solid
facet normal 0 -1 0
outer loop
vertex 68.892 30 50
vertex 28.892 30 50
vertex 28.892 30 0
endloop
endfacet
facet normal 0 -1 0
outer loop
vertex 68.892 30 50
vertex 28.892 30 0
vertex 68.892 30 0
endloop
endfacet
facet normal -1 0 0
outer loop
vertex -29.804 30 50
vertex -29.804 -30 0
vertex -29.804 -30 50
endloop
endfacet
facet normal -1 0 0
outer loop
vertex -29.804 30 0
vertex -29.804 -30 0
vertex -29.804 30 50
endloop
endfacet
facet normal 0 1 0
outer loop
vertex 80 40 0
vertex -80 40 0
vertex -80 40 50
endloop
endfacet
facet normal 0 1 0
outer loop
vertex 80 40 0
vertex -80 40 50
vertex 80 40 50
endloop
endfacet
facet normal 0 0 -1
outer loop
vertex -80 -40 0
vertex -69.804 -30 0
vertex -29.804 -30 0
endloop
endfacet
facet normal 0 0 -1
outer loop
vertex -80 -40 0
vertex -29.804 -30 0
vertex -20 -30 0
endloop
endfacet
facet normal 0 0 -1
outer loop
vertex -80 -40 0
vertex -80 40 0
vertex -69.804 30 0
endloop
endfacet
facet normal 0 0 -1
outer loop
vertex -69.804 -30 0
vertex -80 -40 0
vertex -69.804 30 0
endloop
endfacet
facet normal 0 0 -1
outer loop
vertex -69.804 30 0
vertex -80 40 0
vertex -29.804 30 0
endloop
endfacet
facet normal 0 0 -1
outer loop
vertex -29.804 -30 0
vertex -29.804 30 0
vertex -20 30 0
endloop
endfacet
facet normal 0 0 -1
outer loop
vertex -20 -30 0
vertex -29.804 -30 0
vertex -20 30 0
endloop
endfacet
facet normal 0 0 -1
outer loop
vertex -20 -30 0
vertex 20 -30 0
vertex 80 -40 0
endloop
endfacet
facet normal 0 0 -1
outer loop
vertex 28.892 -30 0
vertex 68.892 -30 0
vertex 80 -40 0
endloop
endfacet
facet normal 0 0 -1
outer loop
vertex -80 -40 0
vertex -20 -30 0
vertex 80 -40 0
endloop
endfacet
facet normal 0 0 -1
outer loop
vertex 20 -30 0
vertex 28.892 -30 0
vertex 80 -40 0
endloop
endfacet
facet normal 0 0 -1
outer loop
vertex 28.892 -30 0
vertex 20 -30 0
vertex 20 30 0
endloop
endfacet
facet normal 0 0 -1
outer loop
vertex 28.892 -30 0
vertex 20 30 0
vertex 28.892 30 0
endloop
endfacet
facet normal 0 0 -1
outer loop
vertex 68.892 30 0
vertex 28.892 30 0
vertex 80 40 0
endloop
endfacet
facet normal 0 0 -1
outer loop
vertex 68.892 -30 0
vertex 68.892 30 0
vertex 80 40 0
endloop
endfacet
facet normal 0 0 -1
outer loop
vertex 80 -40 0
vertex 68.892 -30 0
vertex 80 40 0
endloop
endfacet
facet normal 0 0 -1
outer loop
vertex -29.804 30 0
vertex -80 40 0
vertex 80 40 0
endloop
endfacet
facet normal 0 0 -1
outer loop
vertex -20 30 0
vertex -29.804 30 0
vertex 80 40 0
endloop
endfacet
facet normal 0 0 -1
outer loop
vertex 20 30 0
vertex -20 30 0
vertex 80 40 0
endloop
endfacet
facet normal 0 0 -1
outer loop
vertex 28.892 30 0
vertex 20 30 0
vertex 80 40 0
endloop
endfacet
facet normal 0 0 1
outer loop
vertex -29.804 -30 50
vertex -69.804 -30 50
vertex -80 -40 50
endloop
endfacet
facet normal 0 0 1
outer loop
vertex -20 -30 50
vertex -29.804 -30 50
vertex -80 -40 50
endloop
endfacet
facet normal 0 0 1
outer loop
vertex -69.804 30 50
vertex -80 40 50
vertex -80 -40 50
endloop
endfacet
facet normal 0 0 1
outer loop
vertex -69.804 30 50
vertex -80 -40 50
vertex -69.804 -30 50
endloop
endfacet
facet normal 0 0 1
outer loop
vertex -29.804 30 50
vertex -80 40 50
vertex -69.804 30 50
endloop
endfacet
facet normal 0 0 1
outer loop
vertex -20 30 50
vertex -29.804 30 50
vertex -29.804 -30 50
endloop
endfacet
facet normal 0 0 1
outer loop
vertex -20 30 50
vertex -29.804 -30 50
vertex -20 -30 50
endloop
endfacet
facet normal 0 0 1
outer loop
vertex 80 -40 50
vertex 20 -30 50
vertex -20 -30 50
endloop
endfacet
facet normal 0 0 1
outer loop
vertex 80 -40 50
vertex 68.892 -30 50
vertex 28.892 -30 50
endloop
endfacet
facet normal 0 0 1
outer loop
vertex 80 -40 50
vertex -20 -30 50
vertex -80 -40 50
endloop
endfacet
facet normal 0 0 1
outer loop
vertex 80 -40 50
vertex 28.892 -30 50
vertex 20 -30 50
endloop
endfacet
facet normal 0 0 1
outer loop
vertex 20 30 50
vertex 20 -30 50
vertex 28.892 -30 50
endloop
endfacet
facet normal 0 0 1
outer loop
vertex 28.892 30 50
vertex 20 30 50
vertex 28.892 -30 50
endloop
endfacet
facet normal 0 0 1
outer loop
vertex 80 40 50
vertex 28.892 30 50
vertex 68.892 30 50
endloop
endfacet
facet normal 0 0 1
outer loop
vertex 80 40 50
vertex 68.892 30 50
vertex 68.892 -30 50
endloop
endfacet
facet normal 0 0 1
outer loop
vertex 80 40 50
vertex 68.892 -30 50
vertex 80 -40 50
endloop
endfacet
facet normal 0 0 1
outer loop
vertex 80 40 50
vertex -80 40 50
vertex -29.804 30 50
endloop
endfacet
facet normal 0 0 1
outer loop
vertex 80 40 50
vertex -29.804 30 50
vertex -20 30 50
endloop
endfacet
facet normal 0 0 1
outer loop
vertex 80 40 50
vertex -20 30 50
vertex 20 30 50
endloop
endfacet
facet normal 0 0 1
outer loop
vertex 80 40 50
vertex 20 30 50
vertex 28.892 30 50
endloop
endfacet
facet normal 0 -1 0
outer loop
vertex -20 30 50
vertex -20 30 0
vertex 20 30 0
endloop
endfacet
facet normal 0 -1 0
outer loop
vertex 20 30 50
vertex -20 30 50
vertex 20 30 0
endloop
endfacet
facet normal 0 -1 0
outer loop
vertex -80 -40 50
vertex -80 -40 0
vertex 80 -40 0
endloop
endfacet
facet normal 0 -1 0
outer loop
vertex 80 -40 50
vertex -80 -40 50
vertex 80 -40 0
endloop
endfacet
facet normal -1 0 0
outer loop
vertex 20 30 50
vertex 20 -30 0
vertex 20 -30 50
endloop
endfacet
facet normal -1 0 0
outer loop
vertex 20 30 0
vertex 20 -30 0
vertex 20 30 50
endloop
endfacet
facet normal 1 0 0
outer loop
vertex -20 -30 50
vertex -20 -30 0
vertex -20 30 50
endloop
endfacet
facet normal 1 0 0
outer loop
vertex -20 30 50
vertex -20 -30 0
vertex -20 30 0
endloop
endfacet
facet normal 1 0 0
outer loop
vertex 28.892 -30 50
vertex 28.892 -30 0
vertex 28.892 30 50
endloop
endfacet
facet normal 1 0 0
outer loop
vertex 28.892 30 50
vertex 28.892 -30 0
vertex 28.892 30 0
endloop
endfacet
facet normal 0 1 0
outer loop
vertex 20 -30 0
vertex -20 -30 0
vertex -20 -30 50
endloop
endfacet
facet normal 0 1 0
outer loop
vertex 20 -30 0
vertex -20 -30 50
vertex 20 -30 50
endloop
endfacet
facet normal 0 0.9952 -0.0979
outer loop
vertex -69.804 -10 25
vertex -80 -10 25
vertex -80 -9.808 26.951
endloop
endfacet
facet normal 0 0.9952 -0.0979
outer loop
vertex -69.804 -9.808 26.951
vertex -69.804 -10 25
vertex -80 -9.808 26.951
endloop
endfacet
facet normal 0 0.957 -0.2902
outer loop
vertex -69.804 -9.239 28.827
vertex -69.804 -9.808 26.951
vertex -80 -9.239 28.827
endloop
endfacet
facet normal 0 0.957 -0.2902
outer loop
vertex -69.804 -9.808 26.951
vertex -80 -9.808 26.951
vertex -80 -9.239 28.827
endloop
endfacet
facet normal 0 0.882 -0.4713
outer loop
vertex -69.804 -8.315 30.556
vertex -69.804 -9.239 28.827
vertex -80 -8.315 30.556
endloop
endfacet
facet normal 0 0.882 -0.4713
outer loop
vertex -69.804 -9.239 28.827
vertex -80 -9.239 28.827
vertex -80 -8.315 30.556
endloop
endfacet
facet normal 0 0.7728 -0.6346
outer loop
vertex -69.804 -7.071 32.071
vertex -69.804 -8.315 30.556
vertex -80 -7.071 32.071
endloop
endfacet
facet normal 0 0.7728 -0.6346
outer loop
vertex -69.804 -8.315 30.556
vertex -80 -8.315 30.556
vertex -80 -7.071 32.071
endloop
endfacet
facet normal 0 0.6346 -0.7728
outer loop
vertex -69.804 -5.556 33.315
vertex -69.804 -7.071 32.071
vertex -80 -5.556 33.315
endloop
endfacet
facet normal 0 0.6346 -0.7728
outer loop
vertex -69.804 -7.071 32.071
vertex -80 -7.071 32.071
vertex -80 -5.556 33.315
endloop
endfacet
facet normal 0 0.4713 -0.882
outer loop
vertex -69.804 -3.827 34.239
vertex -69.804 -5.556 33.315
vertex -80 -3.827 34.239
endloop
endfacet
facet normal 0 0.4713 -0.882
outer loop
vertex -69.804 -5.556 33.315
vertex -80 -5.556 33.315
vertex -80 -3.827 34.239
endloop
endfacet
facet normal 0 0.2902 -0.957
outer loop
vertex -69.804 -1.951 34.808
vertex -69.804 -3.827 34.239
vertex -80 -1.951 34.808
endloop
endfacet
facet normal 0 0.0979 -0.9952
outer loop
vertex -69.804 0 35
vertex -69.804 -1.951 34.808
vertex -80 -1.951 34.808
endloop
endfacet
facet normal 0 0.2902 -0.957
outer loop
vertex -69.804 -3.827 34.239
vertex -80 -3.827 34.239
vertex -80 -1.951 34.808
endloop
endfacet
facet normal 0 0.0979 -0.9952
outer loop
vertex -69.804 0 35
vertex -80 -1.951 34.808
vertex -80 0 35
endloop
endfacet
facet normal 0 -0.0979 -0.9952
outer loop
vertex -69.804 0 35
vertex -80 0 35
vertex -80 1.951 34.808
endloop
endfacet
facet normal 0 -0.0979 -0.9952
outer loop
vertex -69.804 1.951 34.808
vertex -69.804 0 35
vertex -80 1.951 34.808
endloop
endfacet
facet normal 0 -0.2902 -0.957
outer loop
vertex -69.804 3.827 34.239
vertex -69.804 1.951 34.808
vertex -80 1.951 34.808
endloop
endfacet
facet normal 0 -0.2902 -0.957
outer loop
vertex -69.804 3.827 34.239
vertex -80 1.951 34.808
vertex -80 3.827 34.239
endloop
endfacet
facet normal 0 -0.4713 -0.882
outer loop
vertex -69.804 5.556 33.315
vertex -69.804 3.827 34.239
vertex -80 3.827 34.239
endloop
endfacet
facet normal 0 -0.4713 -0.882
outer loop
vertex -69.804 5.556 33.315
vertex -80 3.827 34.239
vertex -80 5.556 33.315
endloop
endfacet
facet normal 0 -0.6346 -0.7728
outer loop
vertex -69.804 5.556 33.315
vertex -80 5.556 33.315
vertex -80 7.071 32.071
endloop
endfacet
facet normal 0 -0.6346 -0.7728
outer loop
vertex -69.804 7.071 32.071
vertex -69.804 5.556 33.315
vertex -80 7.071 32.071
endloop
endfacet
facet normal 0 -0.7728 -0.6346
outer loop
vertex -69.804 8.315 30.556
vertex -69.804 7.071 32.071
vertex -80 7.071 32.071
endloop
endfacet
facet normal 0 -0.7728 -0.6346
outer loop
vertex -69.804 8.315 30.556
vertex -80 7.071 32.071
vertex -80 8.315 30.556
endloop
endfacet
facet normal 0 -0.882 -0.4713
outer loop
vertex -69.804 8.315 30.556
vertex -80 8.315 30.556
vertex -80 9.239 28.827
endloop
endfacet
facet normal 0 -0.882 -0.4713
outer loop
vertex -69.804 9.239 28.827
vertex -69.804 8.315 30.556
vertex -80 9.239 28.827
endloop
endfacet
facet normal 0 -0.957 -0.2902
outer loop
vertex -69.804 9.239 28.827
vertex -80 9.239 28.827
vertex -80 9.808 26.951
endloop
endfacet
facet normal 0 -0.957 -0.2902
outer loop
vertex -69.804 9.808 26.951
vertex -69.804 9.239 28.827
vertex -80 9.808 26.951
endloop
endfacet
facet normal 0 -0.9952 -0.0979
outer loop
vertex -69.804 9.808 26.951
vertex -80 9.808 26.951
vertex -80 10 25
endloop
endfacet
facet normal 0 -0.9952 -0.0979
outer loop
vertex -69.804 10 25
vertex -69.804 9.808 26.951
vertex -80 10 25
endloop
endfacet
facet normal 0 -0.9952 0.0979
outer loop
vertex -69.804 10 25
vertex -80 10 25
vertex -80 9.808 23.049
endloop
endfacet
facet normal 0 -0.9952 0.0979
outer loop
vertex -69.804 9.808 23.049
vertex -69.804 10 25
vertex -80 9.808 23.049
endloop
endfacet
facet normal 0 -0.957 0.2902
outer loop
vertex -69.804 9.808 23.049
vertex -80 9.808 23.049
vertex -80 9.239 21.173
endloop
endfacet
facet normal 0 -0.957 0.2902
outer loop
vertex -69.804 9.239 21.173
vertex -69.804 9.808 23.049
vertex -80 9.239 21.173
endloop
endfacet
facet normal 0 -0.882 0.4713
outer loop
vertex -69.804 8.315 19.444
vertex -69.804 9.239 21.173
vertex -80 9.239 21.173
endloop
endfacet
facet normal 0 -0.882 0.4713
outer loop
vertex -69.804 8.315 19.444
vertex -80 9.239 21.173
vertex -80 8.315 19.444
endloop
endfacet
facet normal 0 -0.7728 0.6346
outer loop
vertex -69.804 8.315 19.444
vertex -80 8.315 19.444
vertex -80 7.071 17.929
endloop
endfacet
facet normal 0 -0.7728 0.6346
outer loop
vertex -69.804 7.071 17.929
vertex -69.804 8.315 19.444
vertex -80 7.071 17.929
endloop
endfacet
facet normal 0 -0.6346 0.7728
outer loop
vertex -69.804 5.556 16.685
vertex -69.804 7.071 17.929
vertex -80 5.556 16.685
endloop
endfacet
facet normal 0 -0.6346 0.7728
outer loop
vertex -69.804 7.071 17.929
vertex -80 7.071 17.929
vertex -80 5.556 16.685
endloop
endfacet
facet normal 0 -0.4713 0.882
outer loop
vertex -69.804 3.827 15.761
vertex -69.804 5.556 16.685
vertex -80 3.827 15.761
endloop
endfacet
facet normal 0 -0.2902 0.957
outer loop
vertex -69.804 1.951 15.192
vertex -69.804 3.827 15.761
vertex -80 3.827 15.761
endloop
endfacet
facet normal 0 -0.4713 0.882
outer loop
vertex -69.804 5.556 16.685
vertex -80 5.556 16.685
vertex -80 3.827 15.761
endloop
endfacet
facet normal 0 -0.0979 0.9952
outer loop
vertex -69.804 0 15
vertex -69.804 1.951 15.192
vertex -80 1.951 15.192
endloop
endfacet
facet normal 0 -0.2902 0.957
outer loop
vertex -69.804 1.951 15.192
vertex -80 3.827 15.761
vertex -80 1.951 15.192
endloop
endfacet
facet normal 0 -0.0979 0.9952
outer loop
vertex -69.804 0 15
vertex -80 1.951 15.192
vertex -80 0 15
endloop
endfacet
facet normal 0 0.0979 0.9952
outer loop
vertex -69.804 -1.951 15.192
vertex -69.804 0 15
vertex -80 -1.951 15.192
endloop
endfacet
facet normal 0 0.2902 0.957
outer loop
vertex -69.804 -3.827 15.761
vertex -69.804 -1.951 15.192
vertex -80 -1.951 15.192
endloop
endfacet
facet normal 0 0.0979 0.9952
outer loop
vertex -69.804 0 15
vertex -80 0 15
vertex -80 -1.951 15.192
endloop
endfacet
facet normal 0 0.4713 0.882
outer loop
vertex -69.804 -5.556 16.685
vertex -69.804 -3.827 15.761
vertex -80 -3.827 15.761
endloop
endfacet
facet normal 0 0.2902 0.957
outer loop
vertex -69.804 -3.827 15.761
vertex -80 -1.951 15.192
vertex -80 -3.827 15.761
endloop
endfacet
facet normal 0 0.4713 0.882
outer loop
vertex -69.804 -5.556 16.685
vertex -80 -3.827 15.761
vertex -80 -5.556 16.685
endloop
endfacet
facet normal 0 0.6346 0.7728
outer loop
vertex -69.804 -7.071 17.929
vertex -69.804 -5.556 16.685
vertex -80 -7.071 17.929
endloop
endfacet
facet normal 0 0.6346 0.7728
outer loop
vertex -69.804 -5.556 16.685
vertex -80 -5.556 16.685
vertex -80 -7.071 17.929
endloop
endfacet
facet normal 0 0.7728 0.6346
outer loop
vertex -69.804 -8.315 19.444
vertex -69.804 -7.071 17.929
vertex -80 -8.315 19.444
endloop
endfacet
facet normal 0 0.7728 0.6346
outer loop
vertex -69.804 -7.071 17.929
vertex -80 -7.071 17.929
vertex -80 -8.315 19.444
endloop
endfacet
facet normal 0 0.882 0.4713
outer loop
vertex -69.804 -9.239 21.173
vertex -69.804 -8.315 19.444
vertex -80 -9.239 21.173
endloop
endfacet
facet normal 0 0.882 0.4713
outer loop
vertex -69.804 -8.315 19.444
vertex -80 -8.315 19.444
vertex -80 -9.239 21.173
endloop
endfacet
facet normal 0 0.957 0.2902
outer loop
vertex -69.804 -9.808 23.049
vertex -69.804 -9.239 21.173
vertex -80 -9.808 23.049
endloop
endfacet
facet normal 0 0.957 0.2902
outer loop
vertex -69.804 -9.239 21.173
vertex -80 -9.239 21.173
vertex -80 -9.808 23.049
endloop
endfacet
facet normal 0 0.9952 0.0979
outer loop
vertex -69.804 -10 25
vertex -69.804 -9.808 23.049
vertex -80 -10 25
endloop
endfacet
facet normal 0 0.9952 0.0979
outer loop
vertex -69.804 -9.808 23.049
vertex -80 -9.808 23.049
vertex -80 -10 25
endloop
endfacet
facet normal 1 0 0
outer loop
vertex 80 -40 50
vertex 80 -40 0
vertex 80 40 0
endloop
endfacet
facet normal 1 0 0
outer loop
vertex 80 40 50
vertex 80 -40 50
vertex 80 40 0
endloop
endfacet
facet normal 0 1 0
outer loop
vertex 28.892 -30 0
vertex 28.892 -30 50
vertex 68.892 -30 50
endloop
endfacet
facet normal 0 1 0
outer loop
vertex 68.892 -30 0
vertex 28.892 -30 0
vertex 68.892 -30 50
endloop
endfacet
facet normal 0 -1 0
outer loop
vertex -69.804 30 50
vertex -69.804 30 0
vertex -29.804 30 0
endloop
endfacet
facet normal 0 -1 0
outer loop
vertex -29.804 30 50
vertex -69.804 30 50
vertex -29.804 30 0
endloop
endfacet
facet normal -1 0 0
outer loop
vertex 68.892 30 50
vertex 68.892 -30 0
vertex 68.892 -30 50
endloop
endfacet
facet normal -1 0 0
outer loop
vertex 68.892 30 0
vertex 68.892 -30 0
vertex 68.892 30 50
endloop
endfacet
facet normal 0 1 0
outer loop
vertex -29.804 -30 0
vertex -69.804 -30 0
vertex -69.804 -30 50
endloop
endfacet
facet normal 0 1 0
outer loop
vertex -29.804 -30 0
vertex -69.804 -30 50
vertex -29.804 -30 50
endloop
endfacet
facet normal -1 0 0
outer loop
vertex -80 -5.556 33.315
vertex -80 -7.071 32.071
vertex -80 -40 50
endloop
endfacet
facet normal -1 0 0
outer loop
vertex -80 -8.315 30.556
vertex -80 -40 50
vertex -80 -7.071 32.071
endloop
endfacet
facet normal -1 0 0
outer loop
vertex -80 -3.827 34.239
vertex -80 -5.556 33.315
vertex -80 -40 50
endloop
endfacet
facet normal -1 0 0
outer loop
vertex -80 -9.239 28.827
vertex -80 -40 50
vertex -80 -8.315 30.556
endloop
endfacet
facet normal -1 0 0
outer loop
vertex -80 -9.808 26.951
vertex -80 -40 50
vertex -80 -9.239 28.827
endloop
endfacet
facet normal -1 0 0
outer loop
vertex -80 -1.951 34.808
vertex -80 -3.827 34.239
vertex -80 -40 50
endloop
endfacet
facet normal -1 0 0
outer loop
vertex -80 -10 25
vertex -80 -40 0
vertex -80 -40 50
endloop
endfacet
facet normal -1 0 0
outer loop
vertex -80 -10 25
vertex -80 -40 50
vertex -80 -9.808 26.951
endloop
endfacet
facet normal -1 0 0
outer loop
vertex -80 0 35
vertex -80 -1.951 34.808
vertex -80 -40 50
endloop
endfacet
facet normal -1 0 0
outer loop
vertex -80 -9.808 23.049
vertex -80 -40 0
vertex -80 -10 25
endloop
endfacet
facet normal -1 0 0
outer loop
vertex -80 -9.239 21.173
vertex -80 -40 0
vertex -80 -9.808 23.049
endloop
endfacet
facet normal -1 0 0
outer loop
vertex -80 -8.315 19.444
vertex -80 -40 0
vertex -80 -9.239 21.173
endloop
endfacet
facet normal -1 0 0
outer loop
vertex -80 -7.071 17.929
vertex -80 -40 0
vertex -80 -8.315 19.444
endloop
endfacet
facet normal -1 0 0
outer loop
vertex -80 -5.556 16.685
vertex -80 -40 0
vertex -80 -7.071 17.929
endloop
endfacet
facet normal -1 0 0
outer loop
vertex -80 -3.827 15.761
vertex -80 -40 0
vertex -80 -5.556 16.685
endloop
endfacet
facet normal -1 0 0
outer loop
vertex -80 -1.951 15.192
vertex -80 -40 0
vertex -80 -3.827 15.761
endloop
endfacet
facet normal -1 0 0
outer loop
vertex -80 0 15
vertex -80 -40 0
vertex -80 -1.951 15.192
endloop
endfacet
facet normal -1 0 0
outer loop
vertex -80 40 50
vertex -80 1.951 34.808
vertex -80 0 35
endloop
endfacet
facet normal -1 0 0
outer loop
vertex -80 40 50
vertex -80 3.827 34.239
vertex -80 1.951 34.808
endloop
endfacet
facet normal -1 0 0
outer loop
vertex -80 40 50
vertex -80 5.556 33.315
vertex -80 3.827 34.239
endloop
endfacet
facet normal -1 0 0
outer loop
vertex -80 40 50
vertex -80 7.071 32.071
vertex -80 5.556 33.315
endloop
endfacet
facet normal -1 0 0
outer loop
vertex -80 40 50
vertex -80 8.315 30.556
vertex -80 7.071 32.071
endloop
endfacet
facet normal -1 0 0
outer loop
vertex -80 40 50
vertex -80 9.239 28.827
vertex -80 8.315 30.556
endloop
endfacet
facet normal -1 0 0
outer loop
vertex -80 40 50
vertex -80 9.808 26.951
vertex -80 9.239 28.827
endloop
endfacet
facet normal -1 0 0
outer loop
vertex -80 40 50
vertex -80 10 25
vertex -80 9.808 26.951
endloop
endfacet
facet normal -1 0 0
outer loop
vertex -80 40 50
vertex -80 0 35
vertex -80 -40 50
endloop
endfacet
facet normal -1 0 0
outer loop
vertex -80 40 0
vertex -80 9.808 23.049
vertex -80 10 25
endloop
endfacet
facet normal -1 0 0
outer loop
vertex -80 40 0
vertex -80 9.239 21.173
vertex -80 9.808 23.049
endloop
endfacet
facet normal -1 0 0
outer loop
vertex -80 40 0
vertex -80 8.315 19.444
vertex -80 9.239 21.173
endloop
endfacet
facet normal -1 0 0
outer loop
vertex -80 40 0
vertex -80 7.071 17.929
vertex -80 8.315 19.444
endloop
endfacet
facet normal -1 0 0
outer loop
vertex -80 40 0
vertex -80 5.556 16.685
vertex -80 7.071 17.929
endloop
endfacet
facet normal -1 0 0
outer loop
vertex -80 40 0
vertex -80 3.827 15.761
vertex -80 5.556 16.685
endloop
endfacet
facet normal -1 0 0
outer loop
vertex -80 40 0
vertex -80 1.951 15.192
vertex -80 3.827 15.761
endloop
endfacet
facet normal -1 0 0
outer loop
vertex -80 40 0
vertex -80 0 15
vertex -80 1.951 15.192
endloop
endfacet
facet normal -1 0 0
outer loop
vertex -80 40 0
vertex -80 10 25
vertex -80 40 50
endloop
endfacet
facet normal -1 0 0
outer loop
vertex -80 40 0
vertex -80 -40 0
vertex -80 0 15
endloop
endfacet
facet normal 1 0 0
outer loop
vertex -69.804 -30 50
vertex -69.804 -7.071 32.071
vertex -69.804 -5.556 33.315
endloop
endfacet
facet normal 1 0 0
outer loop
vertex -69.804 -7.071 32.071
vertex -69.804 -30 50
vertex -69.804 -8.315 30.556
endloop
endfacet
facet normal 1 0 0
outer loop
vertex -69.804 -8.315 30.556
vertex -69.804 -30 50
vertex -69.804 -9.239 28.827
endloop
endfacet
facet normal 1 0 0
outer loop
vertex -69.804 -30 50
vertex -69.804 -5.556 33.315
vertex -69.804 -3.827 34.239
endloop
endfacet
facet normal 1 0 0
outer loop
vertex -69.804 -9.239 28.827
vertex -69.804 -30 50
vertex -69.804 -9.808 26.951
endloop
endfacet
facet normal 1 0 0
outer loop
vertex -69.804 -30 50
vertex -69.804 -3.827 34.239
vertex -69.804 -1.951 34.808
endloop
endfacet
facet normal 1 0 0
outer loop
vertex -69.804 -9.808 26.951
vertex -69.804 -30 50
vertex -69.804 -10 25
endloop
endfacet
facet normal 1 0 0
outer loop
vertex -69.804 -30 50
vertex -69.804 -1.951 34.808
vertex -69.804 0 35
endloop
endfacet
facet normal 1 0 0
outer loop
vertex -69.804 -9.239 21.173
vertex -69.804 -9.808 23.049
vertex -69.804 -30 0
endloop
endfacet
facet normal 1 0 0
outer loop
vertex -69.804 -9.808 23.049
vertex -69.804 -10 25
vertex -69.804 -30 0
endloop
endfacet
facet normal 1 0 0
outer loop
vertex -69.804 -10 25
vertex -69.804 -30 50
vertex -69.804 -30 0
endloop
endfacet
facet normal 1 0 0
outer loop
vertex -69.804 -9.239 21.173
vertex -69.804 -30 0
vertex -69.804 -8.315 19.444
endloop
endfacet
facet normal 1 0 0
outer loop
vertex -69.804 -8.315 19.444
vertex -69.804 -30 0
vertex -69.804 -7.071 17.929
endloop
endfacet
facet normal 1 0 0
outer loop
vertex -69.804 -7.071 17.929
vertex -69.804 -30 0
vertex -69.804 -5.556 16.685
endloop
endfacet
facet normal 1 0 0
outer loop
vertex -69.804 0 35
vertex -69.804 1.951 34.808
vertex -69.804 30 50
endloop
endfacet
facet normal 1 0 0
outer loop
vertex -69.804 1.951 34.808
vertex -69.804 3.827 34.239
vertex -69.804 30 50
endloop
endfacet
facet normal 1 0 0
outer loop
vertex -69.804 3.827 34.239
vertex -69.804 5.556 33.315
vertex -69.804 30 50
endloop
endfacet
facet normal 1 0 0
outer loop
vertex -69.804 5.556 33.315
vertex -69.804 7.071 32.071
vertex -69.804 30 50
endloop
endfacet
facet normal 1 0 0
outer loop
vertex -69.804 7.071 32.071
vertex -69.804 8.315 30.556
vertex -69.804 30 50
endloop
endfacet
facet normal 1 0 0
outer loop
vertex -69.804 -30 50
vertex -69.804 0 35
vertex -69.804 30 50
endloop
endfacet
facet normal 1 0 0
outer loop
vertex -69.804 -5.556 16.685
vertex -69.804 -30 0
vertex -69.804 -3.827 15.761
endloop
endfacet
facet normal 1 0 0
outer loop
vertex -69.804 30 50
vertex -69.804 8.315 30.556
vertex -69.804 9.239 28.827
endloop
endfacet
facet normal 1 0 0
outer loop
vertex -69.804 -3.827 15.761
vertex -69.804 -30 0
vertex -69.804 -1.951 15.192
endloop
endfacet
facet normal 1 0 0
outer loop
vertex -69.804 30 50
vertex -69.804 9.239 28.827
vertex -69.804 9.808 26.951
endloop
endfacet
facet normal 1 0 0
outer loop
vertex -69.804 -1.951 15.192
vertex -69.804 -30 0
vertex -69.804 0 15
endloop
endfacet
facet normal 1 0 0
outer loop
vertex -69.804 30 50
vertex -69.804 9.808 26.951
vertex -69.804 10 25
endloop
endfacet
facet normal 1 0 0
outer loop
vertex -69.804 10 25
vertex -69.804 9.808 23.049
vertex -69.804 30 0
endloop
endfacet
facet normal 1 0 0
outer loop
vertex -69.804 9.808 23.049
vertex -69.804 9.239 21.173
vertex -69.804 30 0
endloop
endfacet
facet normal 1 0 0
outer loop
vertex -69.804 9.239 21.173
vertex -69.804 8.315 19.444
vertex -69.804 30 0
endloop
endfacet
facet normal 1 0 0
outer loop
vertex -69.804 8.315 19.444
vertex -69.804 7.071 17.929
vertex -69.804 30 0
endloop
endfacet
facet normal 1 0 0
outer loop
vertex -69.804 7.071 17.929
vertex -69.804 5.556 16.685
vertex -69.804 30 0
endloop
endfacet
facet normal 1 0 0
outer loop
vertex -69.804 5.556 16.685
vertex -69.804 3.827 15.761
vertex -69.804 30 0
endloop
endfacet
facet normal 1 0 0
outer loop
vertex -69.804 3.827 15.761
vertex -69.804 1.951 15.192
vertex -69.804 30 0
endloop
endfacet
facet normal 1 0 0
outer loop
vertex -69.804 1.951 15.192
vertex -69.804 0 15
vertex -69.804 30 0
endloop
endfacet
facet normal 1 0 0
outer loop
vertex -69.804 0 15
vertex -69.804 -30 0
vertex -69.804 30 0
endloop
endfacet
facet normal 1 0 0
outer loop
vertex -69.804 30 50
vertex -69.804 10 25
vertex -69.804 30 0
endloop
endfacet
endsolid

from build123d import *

# Parameters (mm, degrees)
SKETCH_W     = 160
SKETCH_H     = 80
SKETCH_W_2   = 40
SKETCH_H_2   = 60
PAD_DEPTH    = 50
SKETCH001_R  = 10
POCKET_DEPTH = 11


with BuildPart() as part:
    # Sketch → Pad (new body)
    with BuildSketch(Plane.XY):
        Rectangle(SKETCH_W, SKETCH_H)
        with Locations((-49.803748, 0)):
            Rectangle(SKETCH_W_2, SKETCH_H_2, mode=Mode.SUBTRACT)
        Rectangle(SKETCH_W_2, SKETCH_H_2, mode=Mode.SUBTRACT)
        with Locations((48.892394, 0)):
            Rectangle(SKETCH_W_2, SKETCH_H_2, mode=Mode.SUBTRACT)
    extrude(amount=PAD_DEPTH)

    # Sketch001 (on Face1 of Pad) → Pocket (cut)
    with BuildSketch(Plane(origin=(-80, 0, 0), x_dir=(0, -1, 0), z_dir=(-1, 0, 0))):
        with Locations((0, 25)):
            Circle(SKETCH001_R)
    extrude(amount=-POCKET_DEPTH, mode=Mode.SUBTRACT)


solid = part.part
